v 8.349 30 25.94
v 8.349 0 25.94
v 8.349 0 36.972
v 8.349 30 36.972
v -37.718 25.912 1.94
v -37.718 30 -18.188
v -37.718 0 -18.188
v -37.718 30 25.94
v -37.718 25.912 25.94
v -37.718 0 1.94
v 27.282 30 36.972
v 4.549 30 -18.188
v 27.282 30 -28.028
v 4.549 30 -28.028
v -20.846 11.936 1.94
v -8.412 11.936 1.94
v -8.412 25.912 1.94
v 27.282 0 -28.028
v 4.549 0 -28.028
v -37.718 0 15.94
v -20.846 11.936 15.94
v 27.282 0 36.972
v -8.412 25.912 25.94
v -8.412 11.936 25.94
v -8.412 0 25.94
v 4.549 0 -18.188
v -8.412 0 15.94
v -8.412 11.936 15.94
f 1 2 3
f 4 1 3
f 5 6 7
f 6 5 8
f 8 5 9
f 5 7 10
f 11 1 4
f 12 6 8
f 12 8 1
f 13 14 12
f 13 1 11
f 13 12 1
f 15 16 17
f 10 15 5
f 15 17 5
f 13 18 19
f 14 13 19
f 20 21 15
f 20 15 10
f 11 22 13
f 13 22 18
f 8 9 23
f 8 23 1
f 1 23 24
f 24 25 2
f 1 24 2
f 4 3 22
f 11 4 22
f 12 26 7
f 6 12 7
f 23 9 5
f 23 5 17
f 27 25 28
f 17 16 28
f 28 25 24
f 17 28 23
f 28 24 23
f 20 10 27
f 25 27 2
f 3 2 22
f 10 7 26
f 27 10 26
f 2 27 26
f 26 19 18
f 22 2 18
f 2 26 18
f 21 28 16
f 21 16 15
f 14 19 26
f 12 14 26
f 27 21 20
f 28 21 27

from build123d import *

# Parameters (mm, degrees)
EXTRUDE_1_DEPTH     = 30
CUT_EXTRUDE_1_DEPTH = 24
SKETCH_3_W          = 29.306250819
SKETCH_3_H          = 11.935792743
CUT_EXTRUDE_2_DEPTH = 10


with BuildPart() as part:
    # 草图1 → 凸台-拉伸1 (new body)
    with BuildSketch(Plane(origin=(0, 0, 0), x_dir=(1, 0, 0), z_dir=(0, 1, 0))):
        Polygon((-37.717889908, 18.188073394), (-37.717889908, -25.940366972), (8.348623853, -25.940366972), (8.348623853, -36.972477064), (27.282110092, -36.972477064), (27.282110092, 28.027522936), (4.548530182, 28.027522936), (4.548530182, 18.188073394), align=None)
    extrude(amount=EXTRUDE_1_DEPTH)

    # 草图2 → 切除-拉伸1 (cut)
    with BuildSketch(Plane.XY.offset(25.940366972)):
        Polygon((-37.717889908, 25.912398035), (-8.411639089, 25.912398035), (-8.411639089, 11.935792743), (-20.845998279, 11.935792743), (-37.717889908, 0), align=None)
    extrude(amount=-CUT_EXTRUDE_1_DEPTH, mode=Mode.SUBTRACT)

    # 草图3 → 切除-拉伸2 (cut)
    with BuildSketch(Plane.XY.offset(25.940366972)):
        with Locations((-23.064764499, 5.967896372)):
            Rectangle(SKETCH_3_W, SKETCH_3_H)
    extrude(amount=-CUT_EXTRUDE_2_DEPTH, mode=Mode.SUBTRACT)


solid = part.part
